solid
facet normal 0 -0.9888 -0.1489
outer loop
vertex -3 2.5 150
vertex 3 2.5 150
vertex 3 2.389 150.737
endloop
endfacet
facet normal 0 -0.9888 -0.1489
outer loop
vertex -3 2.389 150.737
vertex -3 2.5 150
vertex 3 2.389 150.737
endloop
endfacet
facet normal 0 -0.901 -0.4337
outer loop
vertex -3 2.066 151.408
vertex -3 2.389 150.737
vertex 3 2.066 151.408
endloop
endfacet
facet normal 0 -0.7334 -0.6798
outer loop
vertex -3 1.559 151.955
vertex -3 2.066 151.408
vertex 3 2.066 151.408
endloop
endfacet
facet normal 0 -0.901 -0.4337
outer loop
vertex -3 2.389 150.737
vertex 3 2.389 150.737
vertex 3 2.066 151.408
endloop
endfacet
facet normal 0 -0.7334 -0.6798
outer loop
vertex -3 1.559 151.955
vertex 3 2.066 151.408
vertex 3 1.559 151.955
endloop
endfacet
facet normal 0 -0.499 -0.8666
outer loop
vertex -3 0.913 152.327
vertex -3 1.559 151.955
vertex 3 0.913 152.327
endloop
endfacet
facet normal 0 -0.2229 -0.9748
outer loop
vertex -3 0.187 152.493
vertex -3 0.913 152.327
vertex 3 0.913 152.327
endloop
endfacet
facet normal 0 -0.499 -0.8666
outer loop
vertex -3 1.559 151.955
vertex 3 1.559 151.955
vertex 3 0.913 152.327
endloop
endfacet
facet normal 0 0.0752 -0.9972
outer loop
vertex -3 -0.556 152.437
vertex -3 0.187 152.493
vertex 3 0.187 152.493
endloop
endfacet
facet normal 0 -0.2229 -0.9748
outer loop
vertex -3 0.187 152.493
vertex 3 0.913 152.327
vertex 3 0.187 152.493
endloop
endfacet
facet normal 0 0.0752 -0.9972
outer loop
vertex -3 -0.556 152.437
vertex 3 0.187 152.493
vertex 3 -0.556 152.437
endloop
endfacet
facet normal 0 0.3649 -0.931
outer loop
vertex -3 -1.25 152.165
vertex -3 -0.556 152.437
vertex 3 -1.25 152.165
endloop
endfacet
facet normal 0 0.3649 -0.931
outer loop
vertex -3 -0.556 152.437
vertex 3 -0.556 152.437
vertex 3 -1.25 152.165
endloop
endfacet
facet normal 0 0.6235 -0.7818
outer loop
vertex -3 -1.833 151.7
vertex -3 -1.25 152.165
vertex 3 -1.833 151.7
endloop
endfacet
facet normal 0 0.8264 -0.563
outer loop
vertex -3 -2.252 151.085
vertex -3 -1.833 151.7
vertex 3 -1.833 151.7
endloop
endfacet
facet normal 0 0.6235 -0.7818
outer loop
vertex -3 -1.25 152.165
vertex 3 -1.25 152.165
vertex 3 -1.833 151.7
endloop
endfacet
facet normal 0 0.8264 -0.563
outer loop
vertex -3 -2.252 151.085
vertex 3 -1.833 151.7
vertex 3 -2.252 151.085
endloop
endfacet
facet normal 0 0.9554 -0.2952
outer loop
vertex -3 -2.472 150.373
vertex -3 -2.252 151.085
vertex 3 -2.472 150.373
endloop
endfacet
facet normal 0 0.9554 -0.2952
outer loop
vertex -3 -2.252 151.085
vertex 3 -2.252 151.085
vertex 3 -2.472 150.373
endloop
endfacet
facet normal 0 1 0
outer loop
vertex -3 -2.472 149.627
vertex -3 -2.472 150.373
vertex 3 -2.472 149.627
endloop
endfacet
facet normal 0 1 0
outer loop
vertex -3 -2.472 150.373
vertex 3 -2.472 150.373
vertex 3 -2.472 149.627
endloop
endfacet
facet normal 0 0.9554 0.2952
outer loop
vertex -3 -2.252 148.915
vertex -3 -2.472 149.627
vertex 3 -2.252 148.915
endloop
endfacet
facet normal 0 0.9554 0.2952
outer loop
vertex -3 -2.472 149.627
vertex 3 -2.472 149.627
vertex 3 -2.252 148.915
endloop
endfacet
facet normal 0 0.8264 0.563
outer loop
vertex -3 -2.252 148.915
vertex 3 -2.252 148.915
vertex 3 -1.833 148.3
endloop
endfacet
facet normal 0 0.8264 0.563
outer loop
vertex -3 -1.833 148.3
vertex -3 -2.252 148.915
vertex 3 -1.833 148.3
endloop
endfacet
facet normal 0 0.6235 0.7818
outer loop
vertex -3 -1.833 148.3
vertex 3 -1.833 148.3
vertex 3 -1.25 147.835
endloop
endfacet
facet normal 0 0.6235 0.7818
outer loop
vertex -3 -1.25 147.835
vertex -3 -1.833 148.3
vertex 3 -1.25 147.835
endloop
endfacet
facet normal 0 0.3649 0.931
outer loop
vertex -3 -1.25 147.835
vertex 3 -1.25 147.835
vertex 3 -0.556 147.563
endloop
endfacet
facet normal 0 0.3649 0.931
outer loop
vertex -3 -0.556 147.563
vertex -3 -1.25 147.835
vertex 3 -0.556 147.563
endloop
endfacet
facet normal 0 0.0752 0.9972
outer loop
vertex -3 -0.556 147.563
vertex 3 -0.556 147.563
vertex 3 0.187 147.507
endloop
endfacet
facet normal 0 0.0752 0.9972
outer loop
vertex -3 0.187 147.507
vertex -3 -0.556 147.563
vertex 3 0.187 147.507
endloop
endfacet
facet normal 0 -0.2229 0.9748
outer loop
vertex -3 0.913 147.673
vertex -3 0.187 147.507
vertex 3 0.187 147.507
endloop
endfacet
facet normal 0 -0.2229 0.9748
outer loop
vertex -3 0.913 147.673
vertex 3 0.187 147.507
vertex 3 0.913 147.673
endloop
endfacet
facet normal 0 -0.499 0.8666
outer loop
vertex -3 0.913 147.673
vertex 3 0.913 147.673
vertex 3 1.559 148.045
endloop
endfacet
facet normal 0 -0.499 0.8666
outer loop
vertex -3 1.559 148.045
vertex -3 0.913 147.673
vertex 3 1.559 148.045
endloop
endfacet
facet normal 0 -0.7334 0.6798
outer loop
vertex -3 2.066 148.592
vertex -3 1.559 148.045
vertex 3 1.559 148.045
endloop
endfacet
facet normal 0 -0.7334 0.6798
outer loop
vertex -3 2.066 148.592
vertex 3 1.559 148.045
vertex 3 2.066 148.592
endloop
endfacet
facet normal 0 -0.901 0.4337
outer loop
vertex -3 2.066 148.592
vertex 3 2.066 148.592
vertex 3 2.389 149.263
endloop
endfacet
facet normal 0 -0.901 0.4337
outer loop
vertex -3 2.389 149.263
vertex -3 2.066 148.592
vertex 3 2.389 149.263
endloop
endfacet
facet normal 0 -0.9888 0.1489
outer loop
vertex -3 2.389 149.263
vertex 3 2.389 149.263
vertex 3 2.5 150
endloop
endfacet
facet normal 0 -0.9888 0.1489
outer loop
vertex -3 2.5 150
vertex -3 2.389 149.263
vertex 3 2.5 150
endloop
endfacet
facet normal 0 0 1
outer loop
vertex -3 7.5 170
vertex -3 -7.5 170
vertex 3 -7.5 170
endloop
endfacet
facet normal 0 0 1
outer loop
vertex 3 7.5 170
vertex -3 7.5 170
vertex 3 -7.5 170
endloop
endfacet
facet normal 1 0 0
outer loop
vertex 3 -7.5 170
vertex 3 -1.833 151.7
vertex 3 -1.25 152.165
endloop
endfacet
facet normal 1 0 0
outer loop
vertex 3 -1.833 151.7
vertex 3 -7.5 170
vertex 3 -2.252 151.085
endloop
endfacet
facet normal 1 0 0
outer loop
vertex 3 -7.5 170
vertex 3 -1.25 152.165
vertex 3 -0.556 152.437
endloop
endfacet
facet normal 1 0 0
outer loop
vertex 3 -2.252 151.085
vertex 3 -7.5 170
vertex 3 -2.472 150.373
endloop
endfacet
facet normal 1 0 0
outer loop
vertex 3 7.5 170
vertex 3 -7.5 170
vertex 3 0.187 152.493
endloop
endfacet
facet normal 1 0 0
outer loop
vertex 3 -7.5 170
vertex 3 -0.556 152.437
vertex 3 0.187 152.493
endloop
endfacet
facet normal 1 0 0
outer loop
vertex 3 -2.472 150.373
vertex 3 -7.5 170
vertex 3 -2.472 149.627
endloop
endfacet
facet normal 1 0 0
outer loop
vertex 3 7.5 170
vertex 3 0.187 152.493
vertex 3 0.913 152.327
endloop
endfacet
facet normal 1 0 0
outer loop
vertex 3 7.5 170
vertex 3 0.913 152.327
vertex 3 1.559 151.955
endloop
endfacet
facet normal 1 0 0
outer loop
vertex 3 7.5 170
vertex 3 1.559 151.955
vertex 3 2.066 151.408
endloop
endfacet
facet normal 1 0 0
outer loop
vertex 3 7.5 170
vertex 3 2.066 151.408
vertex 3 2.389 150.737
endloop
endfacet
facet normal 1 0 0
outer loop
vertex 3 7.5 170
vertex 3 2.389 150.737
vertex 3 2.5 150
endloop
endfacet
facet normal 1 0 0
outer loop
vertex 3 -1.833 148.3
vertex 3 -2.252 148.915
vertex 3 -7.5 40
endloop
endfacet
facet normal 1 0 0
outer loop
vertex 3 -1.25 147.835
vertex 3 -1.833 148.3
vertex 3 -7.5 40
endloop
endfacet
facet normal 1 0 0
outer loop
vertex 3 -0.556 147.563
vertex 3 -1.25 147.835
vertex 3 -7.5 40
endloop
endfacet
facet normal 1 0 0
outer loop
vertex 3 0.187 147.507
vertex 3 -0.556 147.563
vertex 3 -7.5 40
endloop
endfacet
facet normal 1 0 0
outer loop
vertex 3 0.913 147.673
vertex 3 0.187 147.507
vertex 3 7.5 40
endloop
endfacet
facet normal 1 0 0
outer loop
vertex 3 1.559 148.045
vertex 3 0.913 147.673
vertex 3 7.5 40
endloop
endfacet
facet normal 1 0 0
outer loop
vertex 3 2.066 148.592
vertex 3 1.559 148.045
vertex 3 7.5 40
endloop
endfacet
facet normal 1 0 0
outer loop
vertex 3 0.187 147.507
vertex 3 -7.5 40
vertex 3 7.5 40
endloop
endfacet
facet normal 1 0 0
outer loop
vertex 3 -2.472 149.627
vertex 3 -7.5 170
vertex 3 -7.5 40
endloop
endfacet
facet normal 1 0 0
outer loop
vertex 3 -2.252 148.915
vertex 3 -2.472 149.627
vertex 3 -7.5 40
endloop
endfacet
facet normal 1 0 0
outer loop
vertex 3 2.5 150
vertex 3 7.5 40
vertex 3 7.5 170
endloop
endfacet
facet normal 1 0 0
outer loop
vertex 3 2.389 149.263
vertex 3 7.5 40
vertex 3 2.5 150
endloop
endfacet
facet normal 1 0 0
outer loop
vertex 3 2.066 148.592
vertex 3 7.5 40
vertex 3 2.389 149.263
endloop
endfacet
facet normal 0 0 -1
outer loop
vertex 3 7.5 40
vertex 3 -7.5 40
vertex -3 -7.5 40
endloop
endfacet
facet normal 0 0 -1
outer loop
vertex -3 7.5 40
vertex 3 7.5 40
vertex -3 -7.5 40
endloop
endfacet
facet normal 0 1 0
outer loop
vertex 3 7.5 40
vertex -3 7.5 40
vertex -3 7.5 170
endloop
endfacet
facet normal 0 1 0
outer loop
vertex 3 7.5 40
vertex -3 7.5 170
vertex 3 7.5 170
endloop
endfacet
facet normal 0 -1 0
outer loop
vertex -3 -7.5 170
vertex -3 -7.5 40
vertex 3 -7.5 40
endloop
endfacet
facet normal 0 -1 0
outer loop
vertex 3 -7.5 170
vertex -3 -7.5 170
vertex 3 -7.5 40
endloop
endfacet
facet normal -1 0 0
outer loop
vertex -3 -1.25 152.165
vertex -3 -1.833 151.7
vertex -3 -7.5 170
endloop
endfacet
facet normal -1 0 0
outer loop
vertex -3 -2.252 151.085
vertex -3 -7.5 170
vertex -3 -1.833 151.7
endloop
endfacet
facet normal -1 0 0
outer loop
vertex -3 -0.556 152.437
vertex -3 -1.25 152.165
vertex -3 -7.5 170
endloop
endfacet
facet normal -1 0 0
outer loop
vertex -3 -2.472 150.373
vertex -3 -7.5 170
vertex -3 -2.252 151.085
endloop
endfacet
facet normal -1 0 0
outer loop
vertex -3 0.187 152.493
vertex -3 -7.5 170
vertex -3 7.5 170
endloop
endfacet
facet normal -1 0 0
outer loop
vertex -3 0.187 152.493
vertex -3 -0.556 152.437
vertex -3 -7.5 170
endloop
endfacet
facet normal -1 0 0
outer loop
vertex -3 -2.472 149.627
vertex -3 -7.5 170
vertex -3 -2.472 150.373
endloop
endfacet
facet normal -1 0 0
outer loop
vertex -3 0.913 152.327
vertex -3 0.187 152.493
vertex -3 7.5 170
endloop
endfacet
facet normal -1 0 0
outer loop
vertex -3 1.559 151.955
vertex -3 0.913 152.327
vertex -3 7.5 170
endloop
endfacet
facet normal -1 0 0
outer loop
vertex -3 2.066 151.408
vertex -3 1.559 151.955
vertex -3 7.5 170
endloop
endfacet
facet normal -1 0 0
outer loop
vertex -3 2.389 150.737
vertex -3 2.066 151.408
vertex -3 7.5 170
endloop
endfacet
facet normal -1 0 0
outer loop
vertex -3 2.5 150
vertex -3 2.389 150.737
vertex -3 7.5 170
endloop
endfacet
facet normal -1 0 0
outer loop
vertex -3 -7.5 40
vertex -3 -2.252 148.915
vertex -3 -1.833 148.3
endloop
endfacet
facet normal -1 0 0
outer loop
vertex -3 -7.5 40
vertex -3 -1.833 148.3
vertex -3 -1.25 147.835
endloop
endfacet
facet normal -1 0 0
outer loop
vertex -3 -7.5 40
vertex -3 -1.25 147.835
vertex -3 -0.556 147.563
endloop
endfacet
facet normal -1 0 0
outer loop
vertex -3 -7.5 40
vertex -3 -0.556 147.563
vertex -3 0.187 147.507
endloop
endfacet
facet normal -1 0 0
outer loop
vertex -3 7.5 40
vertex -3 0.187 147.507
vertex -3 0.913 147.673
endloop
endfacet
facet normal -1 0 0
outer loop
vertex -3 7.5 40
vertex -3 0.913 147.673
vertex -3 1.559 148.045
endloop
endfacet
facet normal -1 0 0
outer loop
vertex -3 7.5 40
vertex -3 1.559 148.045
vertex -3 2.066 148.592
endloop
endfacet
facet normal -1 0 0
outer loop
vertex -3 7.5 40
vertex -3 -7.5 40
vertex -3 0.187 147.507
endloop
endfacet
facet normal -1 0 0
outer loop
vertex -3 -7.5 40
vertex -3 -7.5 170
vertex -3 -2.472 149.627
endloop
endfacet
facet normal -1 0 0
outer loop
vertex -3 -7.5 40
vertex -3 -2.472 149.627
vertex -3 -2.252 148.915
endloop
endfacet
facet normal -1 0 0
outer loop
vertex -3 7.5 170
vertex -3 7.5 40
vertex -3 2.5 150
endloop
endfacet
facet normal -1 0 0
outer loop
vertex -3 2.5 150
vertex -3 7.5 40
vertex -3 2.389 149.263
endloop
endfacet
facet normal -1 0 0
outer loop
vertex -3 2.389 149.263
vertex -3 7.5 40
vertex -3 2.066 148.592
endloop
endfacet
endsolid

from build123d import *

# Parameters (mm, degrees)
ESQUISSE1_W             = 6
ESQUISSE1_H             = 15
BOSS_EXTRU_1_DEPTH      = 170
ESQUISSE2_R             = 2.5
ENL_V_MAT_EXTRU_1_DEPTH = 10
SKETCH1_W               = 6
SKETCH1_H               = 15
CUT_EXTRUDE1_DEPTH      = 40


with BuildPart() as part:
    # Esquisse1 → Boss.-Extru.1 (new body)
    with BuildSketch(Plane.XY):
        Rectangle(ESQUISSE1_W, ESQUISSE1_H)
    extrude(amount=BOSS_EXTRU_1_DEPTH)

    # Esquisse2 → Enlèv. mat.-Extru.1 (cut)
    with BuildSketch(Plane(origin=(3, 0, 0), x_dir=(0, 0, -1), z_dir=(1, 0, 0))):
        with Locations(Location((-150, 0, 0), (0, 0, 90))):
            Circle(ESQUISSE2_R)
    extrude(amount=-ENL_V_MAT_EXTRU_1_DEPTH, mode=Mode.SUBTRACT)

    # Sketch1 → Cut-Extrude1 (cut)
    with BuildSketch(Plane(origin=(0, 0, 0), x_dir=(-1, 0, 0), z_dir=(0, 0, -1))):
        Rectangle(SKETCH1_W, SKETCH1_H)
    extrude(amount=-CUT_EXTRUDE1_DEPTH, mode=Mode.SUBTRACT)


solid = part.part
